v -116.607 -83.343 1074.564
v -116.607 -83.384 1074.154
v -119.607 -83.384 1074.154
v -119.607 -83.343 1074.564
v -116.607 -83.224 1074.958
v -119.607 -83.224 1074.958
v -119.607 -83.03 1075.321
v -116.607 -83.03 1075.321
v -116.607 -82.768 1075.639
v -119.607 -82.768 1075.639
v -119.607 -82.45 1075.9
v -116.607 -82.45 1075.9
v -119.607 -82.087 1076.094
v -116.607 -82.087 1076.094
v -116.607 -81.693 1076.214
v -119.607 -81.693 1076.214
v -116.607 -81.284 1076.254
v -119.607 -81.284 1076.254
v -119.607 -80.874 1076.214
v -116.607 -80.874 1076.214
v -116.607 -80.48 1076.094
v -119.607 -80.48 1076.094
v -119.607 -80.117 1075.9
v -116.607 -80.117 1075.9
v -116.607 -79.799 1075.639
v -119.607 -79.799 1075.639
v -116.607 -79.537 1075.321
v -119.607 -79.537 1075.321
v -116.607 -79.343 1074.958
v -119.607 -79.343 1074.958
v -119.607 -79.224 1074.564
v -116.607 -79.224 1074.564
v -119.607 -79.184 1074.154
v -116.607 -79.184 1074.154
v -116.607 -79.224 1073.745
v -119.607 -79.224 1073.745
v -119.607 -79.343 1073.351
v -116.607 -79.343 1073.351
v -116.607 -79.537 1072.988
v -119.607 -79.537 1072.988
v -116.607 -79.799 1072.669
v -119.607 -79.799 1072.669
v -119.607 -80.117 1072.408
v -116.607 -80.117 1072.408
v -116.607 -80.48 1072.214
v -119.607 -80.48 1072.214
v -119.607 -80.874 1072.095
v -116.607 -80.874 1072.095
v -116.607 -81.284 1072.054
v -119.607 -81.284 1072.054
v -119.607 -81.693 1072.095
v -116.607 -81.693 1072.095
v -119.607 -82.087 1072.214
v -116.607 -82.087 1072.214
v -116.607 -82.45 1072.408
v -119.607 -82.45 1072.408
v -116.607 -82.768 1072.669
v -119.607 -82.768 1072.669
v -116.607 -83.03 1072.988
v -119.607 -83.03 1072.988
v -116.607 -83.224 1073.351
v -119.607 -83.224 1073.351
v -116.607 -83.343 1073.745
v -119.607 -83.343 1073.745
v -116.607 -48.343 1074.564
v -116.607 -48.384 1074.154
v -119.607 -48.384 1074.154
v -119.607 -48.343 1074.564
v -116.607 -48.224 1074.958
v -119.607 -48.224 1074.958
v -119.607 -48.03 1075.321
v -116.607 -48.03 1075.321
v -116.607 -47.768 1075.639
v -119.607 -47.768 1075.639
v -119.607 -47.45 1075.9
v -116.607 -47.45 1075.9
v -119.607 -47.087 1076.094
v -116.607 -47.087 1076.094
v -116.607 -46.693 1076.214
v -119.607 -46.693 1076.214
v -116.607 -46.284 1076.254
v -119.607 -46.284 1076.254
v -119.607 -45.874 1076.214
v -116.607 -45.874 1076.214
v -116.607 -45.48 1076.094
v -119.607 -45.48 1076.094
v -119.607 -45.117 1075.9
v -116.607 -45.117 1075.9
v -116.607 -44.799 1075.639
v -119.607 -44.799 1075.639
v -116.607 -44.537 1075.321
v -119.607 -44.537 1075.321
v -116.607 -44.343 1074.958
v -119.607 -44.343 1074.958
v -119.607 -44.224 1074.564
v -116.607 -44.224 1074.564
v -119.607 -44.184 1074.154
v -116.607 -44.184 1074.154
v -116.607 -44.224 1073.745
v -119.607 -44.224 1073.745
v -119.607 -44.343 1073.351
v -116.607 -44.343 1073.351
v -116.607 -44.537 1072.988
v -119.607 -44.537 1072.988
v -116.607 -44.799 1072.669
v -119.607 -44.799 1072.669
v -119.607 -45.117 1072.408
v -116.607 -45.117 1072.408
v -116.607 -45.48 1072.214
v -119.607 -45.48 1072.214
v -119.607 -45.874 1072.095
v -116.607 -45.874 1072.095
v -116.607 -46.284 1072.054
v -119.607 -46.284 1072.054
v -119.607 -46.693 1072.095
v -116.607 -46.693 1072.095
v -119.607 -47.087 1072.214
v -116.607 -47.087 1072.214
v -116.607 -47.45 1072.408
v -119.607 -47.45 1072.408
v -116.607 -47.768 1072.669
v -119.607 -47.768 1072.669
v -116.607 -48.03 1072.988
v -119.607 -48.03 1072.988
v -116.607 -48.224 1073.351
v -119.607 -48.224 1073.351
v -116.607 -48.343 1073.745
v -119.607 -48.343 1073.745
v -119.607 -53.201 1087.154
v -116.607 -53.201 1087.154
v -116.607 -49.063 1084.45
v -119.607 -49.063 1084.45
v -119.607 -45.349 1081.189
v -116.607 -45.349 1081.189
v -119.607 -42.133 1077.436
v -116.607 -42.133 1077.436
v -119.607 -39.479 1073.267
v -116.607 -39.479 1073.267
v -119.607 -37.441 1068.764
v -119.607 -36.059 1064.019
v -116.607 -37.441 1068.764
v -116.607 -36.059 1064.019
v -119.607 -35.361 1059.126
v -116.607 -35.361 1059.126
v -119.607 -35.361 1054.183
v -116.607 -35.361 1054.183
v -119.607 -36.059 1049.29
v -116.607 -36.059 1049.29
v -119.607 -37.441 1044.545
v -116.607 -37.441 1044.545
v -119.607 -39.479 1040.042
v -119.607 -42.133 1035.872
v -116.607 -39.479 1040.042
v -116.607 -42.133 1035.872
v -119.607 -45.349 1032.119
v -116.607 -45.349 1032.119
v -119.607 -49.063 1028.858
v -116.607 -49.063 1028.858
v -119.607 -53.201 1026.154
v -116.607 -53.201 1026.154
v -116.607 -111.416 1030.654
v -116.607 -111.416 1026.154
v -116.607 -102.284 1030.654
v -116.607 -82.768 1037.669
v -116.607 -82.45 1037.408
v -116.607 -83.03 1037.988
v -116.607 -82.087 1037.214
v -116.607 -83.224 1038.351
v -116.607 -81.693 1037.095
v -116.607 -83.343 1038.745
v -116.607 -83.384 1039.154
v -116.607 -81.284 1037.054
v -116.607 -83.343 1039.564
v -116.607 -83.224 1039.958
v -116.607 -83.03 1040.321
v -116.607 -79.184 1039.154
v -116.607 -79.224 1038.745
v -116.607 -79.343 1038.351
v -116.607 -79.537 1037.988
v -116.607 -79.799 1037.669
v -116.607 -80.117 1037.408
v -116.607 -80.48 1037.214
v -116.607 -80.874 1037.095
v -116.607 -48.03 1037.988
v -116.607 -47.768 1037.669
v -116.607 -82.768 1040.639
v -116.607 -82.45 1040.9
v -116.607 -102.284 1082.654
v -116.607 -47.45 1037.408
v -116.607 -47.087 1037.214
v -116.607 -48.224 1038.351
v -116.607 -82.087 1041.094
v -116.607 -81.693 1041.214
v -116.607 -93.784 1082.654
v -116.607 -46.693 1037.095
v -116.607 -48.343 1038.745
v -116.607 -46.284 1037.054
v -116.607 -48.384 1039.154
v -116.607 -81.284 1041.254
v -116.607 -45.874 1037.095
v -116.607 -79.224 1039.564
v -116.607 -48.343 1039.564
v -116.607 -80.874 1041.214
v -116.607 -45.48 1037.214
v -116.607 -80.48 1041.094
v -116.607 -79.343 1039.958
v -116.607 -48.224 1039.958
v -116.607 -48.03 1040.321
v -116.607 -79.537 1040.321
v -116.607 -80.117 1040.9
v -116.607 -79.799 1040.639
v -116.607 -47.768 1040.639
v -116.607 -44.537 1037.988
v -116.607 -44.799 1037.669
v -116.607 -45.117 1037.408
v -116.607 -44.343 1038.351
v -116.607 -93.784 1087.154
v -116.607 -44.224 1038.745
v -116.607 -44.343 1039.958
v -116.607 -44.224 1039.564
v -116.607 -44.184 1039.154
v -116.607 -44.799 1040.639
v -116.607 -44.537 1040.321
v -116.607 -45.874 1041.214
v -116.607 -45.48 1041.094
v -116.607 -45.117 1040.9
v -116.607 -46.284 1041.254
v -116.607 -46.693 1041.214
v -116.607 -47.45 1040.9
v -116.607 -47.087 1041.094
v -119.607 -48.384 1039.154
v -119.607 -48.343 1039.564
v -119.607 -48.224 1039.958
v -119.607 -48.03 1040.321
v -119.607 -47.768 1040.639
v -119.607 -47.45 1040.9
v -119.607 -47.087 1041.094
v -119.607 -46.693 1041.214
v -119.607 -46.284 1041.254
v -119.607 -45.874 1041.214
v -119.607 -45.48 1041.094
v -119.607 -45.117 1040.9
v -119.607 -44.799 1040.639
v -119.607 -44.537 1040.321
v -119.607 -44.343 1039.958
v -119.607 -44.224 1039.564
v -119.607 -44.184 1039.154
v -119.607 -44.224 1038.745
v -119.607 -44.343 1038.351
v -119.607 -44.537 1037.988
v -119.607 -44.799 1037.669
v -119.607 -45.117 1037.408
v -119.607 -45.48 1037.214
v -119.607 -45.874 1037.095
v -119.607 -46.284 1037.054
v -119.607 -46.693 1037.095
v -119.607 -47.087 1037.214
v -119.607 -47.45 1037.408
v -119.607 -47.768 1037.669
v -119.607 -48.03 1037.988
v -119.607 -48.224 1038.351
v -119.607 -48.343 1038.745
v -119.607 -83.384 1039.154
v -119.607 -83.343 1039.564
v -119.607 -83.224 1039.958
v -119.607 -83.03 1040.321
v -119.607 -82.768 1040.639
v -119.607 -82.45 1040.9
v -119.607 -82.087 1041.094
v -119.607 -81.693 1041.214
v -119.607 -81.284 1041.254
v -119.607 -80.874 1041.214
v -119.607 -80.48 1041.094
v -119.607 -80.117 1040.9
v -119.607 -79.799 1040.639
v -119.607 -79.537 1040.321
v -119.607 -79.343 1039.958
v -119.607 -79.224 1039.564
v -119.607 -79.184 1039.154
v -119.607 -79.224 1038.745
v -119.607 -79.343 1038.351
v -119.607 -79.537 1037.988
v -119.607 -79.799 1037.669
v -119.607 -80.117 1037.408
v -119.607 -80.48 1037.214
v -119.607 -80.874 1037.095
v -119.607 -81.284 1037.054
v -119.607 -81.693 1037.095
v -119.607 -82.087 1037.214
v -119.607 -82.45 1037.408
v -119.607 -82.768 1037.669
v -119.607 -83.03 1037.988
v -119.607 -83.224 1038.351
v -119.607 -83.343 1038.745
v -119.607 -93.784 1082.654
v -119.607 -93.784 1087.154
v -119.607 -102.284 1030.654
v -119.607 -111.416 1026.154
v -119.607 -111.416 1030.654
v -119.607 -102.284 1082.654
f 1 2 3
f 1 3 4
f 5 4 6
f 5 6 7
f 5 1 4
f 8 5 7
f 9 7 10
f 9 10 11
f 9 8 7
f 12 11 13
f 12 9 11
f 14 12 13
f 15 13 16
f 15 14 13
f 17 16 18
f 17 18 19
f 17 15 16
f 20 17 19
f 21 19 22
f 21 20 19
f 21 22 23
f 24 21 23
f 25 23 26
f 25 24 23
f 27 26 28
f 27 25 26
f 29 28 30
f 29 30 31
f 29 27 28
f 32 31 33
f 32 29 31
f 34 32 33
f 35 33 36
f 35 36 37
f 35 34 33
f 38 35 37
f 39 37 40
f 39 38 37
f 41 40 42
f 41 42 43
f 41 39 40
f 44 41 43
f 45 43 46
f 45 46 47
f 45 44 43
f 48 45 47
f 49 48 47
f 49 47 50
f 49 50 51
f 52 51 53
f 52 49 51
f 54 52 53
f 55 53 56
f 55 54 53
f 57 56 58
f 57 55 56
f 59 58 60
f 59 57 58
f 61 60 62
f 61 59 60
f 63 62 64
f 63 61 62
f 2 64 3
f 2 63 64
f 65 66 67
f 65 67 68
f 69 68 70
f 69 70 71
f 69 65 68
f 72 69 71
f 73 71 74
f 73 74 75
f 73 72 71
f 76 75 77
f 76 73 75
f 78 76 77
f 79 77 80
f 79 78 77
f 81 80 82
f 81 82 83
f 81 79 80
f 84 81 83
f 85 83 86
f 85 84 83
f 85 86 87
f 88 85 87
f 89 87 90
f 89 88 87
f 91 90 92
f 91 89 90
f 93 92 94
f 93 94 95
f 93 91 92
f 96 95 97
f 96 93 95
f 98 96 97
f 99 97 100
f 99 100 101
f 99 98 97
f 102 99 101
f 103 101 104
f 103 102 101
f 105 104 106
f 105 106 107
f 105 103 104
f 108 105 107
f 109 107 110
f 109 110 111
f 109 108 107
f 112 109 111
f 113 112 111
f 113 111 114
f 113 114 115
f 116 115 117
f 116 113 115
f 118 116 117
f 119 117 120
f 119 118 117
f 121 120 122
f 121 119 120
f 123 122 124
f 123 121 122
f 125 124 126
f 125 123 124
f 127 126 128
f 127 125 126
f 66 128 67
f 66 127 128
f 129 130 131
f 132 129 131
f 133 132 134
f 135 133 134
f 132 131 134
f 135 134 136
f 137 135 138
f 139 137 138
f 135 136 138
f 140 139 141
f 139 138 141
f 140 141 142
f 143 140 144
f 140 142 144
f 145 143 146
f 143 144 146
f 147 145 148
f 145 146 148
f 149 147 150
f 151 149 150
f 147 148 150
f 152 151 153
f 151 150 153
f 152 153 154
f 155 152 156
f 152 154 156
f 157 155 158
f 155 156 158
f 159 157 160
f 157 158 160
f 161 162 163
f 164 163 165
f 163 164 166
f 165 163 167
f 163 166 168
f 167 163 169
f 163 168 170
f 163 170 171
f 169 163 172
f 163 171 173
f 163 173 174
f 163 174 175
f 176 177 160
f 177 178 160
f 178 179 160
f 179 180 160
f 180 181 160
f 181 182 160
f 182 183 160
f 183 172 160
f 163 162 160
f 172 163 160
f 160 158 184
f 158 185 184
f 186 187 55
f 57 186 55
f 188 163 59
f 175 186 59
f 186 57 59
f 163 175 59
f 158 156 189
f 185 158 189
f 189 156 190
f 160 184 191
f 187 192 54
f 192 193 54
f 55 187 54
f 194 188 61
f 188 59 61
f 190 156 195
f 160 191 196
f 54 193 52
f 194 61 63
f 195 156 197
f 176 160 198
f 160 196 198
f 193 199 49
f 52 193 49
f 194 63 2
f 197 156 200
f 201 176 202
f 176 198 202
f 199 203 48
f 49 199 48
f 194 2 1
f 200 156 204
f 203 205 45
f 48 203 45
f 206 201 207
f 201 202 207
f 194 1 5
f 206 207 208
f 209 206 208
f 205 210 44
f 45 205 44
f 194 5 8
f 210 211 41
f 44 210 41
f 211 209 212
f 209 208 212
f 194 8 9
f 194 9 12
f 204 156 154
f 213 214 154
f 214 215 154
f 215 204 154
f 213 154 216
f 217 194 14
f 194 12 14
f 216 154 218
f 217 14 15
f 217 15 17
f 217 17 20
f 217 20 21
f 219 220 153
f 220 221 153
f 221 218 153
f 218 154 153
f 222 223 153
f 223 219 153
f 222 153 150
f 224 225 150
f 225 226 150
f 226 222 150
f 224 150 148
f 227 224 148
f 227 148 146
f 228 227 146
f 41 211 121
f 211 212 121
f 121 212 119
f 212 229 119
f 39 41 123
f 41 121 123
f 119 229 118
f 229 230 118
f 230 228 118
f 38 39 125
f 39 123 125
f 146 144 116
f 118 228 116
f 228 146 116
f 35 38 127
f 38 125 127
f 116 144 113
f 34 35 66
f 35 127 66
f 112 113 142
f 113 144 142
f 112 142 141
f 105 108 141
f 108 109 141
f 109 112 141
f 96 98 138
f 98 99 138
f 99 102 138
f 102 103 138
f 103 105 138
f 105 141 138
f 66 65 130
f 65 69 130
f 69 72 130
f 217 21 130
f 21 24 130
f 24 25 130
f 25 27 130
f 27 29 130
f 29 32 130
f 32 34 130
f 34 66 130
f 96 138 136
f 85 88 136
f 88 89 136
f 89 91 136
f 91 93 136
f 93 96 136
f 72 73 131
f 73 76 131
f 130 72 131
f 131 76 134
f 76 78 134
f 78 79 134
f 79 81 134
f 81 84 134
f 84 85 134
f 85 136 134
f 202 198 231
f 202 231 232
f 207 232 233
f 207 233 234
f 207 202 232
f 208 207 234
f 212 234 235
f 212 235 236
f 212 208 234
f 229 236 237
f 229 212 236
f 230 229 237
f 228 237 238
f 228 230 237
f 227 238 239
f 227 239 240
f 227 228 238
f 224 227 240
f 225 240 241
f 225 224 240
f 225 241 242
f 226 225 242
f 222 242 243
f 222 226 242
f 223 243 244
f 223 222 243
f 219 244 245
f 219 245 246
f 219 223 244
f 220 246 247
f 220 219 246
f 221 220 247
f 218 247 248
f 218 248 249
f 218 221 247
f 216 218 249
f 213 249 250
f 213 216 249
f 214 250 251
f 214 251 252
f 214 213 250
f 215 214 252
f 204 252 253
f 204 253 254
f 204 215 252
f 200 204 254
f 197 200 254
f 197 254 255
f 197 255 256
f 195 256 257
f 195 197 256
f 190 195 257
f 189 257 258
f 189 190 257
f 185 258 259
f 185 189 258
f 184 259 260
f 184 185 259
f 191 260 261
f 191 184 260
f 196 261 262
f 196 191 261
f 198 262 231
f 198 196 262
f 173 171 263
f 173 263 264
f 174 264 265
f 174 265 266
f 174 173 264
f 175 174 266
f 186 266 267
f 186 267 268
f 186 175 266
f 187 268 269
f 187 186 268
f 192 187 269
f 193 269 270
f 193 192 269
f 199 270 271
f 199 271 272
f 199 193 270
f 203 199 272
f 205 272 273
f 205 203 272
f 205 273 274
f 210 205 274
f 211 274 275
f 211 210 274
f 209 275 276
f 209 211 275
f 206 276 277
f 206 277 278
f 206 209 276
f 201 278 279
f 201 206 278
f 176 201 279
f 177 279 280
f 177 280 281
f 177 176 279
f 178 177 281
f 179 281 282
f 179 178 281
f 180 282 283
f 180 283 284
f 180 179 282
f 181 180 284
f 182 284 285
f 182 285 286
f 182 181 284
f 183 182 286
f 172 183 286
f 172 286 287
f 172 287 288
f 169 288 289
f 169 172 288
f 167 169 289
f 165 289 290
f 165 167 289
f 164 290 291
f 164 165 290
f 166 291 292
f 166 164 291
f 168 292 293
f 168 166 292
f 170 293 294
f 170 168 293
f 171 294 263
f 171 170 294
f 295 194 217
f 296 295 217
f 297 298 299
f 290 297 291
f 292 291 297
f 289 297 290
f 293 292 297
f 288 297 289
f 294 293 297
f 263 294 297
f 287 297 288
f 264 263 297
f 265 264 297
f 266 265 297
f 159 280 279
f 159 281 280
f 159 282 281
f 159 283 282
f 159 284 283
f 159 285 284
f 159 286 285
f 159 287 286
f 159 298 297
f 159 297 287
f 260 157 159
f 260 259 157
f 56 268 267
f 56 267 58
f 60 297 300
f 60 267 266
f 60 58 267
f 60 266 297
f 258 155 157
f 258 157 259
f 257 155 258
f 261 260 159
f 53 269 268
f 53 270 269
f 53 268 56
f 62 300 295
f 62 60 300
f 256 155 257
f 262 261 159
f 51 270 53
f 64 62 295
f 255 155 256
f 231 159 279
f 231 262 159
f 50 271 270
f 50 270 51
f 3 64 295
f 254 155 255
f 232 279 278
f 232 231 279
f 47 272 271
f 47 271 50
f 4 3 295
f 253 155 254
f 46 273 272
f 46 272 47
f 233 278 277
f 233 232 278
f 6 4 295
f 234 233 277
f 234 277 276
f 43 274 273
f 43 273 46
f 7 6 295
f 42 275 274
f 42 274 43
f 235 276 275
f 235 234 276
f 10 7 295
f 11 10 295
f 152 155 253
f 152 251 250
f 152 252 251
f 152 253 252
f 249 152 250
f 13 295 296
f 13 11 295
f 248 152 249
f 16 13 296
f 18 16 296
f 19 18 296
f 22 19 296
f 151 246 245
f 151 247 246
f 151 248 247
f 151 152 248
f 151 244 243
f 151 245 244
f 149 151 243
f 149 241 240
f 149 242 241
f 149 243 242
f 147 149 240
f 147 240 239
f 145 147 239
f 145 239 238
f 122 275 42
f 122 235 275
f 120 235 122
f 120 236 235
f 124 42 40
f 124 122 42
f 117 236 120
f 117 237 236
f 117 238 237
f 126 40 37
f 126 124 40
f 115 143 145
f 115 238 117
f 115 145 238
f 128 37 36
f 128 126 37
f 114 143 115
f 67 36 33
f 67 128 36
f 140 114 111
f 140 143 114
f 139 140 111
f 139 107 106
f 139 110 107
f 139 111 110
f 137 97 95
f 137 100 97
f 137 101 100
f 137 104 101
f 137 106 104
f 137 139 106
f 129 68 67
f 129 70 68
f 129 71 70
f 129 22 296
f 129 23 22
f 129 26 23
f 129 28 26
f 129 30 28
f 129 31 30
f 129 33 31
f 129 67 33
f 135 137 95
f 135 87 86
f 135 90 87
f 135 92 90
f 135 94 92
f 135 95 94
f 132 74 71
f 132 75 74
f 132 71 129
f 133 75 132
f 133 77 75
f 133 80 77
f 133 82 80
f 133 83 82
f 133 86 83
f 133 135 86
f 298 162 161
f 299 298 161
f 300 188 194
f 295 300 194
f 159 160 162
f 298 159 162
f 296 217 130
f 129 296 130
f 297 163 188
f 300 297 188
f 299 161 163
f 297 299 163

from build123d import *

# Parameters (mm, degrees)
SKETCH_2_R      = 2.1
EXTRUDE_1_DEPTH = 3


with BuildPart() as part:
    # 草图2 → 凸台-拉伸1 (new body)
    with BuildSketch(Plane.ZY.offset(116.606649797)):
        with BuildLine():
            Line((1030.654259328, -102.283530386), (1082.654259328, -102.283530386))
            Line((1082.654259328, -102.283530386), (1082.654259328, -93.783530386))
            Line((1082.654259328, -93.783530386), (1087.154259328, -93.783530386))
            Line((1087.154259328, -93.783530386), (1087.154259328, -63.783530386))
            Line((1087.154259328, -63.783530386), (1087.154259328, -53.200711014))
            ThreePointArc((1087.154259328, -53.200711014), (1056.654259328, -35.273255635), (1026.154259328, -53.200711014))
            Line((1026.154259328, -53.200711014), (1026.154259328, -63.783530386))
            Line((1026.154259328, -63.783530386), (1026.154259328, -111.416059373))
            Line((1026.154259328, -111.416059373), (1030.654259328, -111.416059373))
            Line((1030.654259328, -111.416059373), (1030.654259328, -102.283530386))
        make_face()
        with Locations(Location((1074.154259328, -81.283530386, 0), (0, 0, 270))):
            Circle(SKETCH_2_R, mode=Mode.SUBTRACT)
        with Locations(Location((1039.154259328, -81.283530386, 0), (0, 0, 270))):
            Circle(SKETCH_2_R, mode=Mode.SUBTRACT)
        with Locations(Location((1074.154259328, -46.283530386, 0), (0, 0, 270))):
            Circle(SKETCH_2_R, mode=Mode.SUBTRACT)
        with Locations(Location((1039.154259328, -46.283530386, 0), (0, 0, 270))):
            Circle(SKETCH_2_R, mode=Mode.SUBTRACT)
    extrude(amount=EXTRUDE_1_DEPTH)


solid = part.part
